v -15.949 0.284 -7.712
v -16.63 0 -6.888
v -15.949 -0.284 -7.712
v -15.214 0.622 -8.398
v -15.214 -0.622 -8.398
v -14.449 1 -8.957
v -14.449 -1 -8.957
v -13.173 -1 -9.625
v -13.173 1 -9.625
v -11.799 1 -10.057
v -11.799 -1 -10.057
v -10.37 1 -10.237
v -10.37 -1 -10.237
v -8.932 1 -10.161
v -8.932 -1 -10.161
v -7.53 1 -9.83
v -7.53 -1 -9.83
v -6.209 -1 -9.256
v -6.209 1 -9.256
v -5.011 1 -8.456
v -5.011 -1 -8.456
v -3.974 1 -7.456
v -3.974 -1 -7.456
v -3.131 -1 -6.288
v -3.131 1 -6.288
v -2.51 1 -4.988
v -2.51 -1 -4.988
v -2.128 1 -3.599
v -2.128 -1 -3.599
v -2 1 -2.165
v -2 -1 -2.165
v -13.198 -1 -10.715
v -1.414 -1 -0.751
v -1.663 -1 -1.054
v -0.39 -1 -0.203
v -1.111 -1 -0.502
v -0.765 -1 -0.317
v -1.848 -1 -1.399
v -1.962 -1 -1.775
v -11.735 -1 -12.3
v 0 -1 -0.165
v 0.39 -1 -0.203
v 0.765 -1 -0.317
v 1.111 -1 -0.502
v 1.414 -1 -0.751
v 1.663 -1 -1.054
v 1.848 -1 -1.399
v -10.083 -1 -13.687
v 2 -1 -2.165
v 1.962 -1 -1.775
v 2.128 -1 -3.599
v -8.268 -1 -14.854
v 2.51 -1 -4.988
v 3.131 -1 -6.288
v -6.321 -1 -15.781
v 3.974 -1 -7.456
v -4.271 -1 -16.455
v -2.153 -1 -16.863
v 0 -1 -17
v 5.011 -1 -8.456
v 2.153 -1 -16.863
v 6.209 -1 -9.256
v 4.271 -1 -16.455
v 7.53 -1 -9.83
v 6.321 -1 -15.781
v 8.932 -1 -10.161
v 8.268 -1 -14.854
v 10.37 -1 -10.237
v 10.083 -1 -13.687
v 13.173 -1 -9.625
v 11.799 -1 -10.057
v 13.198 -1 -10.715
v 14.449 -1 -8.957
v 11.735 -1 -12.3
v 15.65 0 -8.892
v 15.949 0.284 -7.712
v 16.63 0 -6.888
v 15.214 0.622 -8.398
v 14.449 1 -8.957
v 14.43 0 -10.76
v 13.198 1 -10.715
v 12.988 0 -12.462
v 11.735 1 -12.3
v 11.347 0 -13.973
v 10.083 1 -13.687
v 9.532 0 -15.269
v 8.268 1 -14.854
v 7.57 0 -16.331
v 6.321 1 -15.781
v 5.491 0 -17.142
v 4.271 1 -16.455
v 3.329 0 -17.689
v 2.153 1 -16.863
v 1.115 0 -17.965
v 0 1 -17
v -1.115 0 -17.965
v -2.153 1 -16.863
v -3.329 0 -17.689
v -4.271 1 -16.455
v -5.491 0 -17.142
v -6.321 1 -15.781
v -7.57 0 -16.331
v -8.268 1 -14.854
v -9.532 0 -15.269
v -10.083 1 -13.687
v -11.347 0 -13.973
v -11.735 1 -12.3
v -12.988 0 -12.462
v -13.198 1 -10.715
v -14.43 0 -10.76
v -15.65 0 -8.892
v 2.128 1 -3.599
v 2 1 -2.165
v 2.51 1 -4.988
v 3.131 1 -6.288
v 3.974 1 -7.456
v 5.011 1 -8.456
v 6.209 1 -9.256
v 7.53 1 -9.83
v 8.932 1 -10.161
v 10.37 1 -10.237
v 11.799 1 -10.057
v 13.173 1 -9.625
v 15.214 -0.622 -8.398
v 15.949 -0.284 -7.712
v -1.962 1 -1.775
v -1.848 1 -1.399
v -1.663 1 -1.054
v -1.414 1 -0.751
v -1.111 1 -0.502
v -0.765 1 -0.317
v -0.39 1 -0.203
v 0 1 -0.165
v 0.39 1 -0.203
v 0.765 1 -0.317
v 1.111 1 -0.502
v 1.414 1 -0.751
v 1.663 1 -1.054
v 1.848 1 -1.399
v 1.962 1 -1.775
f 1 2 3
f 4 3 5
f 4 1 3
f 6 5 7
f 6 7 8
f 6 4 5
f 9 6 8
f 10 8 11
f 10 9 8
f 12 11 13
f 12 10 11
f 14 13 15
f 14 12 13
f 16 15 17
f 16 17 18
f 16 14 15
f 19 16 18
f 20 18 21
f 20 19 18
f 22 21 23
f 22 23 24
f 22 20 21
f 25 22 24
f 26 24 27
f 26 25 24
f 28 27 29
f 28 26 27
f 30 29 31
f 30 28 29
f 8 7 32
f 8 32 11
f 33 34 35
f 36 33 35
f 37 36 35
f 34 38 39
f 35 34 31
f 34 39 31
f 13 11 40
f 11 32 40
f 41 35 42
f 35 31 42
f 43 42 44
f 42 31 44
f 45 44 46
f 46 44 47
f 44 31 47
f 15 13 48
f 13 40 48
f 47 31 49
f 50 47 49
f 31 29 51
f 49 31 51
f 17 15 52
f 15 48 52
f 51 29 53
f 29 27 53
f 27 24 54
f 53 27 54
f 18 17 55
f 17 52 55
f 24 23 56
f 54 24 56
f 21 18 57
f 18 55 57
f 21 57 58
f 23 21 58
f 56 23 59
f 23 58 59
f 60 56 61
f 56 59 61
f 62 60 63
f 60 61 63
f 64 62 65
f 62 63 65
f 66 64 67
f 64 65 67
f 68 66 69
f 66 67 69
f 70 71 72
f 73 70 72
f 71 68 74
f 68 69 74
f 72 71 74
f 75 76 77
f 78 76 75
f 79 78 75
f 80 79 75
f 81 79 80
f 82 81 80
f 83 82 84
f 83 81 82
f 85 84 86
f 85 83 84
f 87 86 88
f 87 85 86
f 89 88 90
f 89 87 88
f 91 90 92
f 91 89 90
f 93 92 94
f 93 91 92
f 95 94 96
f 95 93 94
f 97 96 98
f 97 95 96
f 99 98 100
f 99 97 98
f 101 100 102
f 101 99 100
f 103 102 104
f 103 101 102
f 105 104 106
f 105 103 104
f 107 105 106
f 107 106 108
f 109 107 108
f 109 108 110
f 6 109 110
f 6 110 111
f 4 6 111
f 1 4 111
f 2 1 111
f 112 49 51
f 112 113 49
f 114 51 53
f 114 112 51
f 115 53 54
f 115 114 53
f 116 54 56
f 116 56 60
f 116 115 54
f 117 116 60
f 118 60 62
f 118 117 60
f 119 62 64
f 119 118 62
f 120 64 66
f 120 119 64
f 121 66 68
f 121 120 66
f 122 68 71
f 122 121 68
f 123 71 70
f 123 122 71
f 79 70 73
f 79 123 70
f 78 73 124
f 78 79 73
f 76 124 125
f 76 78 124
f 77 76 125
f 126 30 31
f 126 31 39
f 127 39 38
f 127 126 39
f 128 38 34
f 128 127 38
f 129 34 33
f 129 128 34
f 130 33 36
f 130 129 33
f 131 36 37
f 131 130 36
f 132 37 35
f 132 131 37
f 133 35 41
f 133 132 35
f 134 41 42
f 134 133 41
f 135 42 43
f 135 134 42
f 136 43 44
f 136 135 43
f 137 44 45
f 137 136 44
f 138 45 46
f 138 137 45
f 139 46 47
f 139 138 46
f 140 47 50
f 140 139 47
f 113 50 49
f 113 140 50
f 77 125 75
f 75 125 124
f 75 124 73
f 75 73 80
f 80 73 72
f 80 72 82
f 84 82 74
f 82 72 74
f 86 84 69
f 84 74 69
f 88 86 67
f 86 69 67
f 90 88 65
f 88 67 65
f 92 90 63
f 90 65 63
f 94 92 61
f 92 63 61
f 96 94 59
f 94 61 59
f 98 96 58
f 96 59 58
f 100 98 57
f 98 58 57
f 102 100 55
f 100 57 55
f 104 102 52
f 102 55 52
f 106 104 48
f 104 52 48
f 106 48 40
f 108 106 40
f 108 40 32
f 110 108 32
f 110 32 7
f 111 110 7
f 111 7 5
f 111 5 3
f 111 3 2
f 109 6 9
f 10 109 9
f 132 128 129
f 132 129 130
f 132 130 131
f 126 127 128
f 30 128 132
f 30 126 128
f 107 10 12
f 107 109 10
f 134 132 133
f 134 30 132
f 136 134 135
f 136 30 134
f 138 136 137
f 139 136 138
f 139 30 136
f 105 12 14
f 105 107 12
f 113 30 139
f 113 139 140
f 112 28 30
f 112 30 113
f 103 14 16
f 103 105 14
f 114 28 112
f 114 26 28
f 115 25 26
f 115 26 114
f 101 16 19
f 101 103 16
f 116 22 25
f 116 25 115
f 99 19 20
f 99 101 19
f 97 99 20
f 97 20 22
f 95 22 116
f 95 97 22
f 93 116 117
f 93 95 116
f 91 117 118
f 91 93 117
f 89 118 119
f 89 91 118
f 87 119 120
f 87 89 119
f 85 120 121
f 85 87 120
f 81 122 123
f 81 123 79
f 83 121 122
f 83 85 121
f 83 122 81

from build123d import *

# Parameters (mm, degrees)
BOSS_EXTRUDE1_DEPTH = 1
CHAMFER1_SIZE       = 1


with BuildPart() as part:
    # Sketch1 → Boss-Extrude1 (new, symmetric)
    with BuildSketch(Plane(origin=(0, 0, 0), x_dir=(1, 0, 0), z_dir=(0, 1, 0))):
        with BuildLine():
            ThreePointArc((16.629831585, 6.888301783), (0, 18), (-16.629831585, 6.888301783))
            ThreePointArc((-16.629831585, 6.888301783), (-7.595646594, 9.851519544), (-2, 2.164784401))
            ThreePointArc((-2, 2.164784401), (0, 0.164784401), (2, 2.164784401))
            ThreePointArc((2, 2.164784401), (7.595646594, 9.851519544), (16.629831585, 6.888301783))
        make_face()
    extrude(amount=BOSS_EXTRUDE1_DEPTH, both=True)

    # Chamfer1
    chamfer1_edges = [part.edges().sort_by_distance(p)[0] for p in [
        (0, -1, -18),
        (0, 1, -18),
    ]]
    chamfer(chamfer1_edges, length=CHAMFER1_SIZE - 0.0001)  # a hair under: the kernel refuses the full size


solid = part.part
